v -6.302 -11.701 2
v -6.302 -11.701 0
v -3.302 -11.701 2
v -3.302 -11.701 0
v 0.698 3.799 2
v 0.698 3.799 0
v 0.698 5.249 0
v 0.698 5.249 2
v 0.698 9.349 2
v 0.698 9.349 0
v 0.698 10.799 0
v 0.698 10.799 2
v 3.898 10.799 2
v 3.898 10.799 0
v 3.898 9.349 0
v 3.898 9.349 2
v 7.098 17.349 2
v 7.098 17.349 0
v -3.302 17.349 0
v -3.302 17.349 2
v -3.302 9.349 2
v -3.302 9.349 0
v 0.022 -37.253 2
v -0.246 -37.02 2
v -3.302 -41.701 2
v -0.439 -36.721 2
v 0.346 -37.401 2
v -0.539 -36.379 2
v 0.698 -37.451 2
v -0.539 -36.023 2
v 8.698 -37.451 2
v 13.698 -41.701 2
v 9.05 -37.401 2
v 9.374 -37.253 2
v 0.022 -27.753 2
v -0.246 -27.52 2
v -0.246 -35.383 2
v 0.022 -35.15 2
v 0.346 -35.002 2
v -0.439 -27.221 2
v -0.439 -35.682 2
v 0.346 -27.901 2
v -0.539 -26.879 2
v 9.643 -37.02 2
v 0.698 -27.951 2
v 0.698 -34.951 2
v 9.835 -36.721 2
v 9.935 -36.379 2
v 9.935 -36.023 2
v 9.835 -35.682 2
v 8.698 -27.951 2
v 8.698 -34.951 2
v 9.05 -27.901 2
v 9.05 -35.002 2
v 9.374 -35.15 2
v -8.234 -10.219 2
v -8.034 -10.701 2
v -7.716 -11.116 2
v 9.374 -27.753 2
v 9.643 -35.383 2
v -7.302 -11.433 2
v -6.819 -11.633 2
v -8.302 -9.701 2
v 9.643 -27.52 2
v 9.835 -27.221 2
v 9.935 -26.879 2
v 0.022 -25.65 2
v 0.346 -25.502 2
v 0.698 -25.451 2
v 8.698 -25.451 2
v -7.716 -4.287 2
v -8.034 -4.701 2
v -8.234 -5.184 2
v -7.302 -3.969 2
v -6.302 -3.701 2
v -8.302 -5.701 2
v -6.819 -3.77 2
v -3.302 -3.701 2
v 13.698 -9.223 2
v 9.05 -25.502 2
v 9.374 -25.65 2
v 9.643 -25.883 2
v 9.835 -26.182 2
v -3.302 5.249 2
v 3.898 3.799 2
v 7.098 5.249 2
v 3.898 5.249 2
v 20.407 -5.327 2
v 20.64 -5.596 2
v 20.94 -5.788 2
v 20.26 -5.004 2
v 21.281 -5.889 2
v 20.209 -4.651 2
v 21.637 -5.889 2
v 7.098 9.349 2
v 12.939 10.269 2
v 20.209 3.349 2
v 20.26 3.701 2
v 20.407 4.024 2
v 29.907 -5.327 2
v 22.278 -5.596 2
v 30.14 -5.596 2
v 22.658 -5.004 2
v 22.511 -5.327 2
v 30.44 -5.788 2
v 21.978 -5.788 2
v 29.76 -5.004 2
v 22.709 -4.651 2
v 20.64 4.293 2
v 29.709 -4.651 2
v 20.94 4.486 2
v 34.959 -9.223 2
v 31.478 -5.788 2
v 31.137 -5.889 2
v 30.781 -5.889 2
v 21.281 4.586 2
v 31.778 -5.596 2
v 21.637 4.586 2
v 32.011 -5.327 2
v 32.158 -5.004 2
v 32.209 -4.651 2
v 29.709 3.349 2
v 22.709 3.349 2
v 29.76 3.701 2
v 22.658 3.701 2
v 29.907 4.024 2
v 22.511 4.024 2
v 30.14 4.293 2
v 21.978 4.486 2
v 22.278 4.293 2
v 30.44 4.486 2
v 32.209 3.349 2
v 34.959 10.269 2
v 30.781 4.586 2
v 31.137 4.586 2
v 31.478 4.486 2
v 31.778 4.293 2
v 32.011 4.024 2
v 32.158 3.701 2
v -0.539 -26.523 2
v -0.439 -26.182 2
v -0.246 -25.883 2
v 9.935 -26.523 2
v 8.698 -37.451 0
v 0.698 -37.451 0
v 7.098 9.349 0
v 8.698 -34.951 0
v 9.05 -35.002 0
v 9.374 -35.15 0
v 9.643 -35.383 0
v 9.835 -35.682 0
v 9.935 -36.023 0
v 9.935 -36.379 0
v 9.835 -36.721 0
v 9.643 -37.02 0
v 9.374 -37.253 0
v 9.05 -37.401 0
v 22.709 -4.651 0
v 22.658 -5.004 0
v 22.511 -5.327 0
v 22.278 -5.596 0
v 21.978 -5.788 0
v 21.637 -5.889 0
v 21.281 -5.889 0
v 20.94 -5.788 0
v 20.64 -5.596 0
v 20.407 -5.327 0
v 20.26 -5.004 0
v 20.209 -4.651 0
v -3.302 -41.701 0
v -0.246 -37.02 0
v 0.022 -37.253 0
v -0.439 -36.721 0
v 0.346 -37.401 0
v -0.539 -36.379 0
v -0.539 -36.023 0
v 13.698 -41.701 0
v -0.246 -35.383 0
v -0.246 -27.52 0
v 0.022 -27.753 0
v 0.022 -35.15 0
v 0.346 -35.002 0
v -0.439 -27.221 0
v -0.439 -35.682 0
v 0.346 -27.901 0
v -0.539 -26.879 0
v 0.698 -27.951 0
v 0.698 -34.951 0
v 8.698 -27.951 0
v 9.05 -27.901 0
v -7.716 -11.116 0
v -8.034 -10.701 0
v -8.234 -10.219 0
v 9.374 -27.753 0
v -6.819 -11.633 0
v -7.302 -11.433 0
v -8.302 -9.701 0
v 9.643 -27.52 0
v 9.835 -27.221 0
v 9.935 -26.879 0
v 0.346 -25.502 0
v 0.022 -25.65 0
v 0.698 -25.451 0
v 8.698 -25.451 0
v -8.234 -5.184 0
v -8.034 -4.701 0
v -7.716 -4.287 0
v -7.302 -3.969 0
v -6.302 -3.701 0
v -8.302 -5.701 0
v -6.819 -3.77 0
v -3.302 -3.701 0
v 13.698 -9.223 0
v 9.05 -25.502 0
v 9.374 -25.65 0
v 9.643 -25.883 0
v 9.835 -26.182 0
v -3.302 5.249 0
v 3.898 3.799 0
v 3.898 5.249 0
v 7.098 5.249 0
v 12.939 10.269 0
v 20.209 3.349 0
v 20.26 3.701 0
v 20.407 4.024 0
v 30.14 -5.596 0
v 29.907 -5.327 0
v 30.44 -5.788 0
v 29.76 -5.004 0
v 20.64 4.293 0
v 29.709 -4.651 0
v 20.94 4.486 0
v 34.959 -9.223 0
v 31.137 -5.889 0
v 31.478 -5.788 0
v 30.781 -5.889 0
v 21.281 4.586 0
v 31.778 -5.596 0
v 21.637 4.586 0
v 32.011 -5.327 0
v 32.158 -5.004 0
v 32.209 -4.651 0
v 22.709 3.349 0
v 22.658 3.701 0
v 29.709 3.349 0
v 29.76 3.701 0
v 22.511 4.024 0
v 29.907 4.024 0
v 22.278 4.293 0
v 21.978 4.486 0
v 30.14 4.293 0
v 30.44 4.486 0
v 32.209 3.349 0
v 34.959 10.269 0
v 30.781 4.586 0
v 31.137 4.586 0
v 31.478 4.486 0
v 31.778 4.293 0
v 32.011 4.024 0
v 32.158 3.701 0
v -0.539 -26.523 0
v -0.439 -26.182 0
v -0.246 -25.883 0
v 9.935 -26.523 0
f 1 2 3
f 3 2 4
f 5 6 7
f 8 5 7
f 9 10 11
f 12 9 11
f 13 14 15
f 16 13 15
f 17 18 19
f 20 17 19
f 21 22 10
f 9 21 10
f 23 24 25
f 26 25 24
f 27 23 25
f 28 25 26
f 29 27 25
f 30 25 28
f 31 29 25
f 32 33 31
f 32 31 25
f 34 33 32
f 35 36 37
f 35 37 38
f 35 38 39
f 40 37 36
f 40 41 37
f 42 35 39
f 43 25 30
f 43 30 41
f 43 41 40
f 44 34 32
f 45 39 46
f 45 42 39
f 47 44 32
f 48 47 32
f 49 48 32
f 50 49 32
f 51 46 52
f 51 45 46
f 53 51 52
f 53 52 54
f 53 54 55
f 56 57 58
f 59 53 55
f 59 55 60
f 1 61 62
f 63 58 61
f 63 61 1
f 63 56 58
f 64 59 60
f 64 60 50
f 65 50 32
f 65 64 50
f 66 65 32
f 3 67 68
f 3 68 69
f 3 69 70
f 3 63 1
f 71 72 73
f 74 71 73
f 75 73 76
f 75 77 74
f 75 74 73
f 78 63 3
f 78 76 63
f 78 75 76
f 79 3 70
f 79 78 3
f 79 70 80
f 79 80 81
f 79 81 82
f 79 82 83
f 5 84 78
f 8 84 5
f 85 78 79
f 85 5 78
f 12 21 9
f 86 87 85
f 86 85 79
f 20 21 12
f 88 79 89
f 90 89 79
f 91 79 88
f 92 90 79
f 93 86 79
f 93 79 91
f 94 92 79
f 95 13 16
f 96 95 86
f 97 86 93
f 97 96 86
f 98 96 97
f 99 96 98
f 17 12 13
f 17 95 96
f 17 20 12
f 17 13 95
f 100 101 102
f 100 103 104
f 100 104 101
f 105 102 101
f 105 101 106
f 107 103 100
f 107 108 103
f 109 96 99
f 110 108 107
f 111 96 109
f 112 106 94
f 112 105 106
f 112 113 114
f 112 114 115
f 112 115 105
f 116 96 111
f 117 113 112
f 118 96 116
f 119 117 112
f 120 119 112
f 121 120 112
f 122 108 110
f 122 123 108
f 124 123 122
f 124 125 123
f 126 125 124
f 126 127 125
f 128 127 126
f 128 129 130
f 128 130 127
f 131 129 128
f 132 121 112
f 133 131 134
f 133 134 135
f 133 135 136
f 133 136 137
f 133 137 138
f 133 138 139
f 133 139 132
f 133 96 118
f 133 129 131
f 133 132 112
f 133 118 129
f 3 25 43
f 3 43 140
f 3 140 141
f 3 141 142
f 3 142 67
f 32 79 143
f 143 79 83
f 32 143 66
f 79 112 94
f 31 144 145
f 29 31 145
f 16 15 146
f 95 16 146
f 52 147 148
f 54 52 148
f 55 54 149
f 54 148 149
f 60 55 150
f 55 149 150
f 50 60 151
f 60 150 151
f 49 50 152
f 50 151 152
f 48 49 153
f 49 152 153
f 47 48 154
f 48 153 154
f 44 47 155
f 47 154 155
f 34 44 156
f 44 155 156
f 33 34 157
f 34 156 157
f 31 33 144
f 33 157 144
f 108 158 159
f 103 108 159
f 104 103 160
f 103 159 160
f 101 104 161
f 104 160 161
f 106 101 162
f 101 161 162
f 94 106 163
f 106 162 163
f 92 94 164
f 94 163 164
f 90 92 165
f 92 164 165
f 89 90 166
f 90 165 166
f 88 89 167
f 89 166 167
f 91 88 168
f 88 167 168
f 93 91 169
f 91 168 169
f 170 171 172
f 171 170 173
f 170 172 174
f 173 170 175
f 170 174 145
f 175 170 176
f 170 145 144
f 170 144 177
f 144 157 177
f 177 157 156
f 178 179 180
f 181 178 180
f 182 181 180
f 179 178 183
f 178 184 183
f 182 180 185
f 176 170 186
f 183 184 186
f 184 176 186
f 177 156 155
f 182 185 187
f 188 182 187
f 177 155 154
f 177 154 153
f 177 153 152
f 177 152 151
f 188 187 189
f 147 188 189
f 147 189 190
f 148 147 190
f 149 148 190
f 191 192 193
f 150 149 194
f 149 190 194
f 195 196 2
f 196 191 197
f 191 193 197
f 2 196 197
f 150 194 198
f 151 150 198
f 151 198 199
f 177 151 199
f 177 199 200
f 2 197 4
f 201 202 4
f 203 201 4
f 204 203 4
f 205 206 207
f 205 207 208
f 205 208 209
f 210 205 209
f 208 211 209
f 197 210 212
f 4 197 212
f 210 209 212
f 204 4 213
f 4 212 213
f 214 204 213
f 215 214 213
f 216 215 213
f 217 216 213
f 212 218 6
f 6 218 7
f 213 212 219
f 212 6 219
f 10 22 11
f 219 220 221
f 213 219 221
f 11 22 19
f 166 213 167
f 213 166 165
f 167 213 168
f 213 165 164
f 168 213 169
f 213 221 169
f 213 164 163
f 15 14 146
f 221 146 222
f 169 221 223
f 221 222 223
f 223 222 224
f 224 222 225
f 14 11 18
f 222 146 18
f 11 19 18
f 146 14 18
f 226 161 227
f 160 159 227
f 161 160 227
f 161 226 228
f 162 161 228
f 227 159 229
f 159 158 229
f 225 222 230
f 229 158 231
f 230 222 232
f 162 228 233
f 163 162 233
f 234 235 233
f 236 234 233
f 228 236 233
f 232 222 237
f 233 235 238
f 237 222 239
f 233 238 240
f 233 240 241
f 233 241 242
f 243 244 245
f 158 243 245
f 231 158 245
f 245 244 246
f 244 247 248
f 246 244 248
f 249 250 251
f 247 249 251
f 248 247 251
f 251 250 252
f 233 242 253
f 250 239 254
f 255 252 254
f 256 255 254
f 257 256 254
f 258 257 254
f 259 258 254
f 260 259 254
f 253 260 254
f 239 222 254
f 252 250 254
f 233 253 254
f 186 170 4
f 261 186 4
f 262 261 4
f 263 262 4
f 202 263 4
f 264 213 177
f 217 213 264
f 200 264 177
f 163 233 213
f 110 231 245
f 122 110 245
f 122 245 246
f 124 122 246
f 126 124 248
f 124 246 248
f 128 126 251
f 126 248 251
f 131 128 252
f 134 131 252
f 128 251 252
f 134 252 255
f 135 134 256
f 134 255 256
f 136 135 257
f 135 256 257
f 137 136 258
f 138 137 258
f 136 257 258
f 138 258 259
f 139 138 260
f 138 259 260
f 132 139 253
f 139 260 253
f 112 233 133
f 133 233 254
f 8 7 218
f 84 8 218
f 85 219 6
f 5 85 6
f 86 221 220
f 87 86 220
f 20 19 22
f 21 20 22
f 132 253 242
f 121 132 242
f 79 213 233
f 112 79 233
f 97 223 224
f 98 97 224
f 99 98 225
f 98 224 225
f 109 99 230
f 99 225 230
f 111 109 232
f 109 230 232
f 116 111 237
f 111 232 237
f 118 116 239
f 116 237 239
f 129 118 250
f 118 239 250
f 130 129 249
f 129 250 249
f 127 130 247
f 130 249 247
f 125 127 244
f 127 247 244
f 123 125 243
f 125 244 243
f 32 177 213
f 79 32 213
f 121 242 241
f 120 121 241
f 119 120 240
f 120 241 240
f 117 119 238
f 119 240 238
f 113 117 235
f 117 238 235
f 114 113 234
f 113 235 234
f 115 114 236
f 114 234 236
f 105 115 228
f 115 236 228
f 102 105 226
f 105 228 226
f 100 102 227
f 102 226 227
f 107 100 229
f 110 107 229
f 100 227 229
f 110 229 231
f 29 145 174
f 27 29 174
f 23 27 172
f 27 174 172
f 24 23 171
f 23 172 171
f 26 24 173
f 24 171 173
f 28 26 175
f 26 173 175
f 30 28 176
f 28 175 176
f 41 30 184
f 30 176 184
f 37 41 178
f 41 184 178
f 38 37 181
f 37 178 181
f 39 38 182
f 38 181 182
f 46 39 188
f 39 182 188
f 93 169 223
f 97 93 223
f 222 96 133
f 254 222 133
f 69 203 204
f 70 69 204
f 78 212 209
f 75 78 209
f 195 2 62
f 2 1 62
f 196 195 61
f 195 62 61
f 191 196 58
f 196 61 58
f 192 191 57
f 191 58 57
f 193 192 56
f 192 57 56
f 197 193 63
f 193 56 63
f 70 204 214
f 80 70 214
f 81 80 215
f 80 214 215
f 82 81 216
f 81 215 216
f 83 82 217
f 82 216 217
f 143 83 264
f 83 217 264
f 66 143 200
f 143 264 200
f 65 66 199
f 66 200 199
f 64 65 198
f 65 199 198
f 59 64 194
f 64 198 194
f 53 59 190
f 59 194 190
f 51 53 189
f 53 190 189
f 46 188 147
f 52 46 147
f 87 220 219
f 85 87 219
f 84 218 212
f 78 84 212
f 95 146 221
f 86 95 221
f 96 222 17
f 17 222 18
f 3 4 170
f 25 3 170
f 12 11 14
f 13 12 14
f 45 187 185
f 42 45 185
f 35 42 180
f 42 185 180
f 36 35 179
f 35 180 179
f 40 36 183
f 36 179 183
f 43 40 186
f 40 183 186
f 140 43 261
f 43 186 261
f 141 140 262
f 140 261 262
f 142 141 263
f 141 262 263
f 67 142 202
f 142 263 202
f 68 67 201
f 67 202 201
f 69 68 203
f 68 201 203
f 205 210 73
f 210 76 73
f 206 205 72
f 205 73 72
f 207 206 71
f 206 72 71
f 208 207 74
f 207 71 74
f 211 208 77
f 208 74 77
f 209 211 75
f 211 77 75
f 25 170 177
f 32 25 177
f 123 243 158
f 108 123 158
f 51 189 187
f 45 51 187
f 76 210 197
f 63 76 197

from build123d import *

# Parameters (mm, degrees)
EXTRUDE_1_DEPTH = 2
FILLET_1_R      = 2
SKETCH_5_W      = 25.102776666
SKETCH_5_H      = 0.92
EXTRUDE_2_DEPTH = 2


with BuildPart() as part:
    # 草图1 → 凸台-拉伸1 (new body)
    with BuildSketch(Plane.XY):
        Polygon((-8.301811847, -11.701358885), (-3.301811847, -11.701358885), (-3.301811847, -41.701358885), (13.698188153, -41.701358885), (13.698188153, -9.223166137), (34.95900929, -9.223166137), (34.95900929, 9.348641115), (13.698188153, 9.348641115), (7.098188153, 17.348641115), (-3.301811847, 17.348641115), (-3.301811847, 9.348641115), (0.698188153, 9.348641115), (0.698188153, 10.798641115), (3.898188153, 10.798641115), (3.898188153, 9.348641115), (7.098188153, 9.348641115), (7.098188153, 5.248641115), (3.898188153, 5.248641115), (3.898188153, 3.798641115), (0.698188153, 3.798641115), (0.698188153, 5.248641115), (-3.301811847, 5.248641115), (-3.301811847, -3.701358885), (-8.301811847, -3.701358885), align=None)
        with BuildLine():
            Line((0.698188153, -25.451358885), (8.698188153, -25.451358885))
            ThreePointArc((8.698188153, -25.451358885), (9.948188153, -26.701358885), (8.698188153, -27.951358885))
            Line((8.698188153, -27.951358885), (0.698188153, -27.951358885))
            ThreePointArc((0.698188153, -27.951358885), (-0.551811847, -26.701358885), (0.698188153, -25.451358885))
        make_face(mode=Mode.SUBTRACT)
        with BuildLine():
            Line((8.698188153, -37.451358885), (0.698188153, -37.451358885))
            ThreePointArc((0.698188153, -37.451358885), (-0.551811847, -36.201358885), (0.698188153, -34.951358885))
            Line((0.698188153, -34.951358885), (8.698188153, -34.951358885))
            ThreePointArc((8.698188153, -34.951358885), (9.948188153, -36.201358885), (8.698188153, -37.451358885))
        make_face(mode=Mode.SUBTRACT)
        with BuildLine():
            Line((32.20900929, 3.348641115), (32.20900929, -4.651358885))
            ThreePointArc((32.20900929, -4.651358885), (30.95900929, -5.901358885), (29.70900929, -4.651358885))
            Line((29.70900929, -4.651358885), (29.70900929, 3.348641115))
            ThreePointArc((29.70900929, 3.348641115), (30.95900929, 4.598641115), (32.20900929, 3.348641115))
        make_face(mode=Mode.SUBTRACT)
        with BuildLine():
            Line((22.70900929, 3.348641115), (22.70900929, -4.651358885))
            ThreePointArc((22.70900929, -4.651358885), (21.45900929, -5.901358885), (20.20900929, -4.651358885))
            Line((20.20900929, -4.651358885), (20.20900929, 3.348641115))
            ThreePointArc((20.20900929, 3.348641115), (21.45900929, 4.598641115), (22.70900929, 3.348641115))
        make_face(mode=Mode.SUBTRACT)
    extrude(amount=EXTRUDE_1_DEPTH)

    # 圆角1
    fillet_1_edges = [part.edges().sort_by_distance(p)[0] for p in [
        (-8.301811847, -3.701358885, 1),
        (-8.301811847, -11.701358885, 1),
    ]]
    fillet(fillet_1_edges, radius=FILLET_1_R)

    # 草图5 → 凸台-拉伸2 (add)
    with BuildSketch(Plane.XY.offset(2)):
        with Locations((22.407620957, 9.808641115)):
            Rectangle(SKETCH_5_W, SKETCH_5_H)
    extrude(amount=-EXTRUDE_2_DEPTH)


solid = part.part
